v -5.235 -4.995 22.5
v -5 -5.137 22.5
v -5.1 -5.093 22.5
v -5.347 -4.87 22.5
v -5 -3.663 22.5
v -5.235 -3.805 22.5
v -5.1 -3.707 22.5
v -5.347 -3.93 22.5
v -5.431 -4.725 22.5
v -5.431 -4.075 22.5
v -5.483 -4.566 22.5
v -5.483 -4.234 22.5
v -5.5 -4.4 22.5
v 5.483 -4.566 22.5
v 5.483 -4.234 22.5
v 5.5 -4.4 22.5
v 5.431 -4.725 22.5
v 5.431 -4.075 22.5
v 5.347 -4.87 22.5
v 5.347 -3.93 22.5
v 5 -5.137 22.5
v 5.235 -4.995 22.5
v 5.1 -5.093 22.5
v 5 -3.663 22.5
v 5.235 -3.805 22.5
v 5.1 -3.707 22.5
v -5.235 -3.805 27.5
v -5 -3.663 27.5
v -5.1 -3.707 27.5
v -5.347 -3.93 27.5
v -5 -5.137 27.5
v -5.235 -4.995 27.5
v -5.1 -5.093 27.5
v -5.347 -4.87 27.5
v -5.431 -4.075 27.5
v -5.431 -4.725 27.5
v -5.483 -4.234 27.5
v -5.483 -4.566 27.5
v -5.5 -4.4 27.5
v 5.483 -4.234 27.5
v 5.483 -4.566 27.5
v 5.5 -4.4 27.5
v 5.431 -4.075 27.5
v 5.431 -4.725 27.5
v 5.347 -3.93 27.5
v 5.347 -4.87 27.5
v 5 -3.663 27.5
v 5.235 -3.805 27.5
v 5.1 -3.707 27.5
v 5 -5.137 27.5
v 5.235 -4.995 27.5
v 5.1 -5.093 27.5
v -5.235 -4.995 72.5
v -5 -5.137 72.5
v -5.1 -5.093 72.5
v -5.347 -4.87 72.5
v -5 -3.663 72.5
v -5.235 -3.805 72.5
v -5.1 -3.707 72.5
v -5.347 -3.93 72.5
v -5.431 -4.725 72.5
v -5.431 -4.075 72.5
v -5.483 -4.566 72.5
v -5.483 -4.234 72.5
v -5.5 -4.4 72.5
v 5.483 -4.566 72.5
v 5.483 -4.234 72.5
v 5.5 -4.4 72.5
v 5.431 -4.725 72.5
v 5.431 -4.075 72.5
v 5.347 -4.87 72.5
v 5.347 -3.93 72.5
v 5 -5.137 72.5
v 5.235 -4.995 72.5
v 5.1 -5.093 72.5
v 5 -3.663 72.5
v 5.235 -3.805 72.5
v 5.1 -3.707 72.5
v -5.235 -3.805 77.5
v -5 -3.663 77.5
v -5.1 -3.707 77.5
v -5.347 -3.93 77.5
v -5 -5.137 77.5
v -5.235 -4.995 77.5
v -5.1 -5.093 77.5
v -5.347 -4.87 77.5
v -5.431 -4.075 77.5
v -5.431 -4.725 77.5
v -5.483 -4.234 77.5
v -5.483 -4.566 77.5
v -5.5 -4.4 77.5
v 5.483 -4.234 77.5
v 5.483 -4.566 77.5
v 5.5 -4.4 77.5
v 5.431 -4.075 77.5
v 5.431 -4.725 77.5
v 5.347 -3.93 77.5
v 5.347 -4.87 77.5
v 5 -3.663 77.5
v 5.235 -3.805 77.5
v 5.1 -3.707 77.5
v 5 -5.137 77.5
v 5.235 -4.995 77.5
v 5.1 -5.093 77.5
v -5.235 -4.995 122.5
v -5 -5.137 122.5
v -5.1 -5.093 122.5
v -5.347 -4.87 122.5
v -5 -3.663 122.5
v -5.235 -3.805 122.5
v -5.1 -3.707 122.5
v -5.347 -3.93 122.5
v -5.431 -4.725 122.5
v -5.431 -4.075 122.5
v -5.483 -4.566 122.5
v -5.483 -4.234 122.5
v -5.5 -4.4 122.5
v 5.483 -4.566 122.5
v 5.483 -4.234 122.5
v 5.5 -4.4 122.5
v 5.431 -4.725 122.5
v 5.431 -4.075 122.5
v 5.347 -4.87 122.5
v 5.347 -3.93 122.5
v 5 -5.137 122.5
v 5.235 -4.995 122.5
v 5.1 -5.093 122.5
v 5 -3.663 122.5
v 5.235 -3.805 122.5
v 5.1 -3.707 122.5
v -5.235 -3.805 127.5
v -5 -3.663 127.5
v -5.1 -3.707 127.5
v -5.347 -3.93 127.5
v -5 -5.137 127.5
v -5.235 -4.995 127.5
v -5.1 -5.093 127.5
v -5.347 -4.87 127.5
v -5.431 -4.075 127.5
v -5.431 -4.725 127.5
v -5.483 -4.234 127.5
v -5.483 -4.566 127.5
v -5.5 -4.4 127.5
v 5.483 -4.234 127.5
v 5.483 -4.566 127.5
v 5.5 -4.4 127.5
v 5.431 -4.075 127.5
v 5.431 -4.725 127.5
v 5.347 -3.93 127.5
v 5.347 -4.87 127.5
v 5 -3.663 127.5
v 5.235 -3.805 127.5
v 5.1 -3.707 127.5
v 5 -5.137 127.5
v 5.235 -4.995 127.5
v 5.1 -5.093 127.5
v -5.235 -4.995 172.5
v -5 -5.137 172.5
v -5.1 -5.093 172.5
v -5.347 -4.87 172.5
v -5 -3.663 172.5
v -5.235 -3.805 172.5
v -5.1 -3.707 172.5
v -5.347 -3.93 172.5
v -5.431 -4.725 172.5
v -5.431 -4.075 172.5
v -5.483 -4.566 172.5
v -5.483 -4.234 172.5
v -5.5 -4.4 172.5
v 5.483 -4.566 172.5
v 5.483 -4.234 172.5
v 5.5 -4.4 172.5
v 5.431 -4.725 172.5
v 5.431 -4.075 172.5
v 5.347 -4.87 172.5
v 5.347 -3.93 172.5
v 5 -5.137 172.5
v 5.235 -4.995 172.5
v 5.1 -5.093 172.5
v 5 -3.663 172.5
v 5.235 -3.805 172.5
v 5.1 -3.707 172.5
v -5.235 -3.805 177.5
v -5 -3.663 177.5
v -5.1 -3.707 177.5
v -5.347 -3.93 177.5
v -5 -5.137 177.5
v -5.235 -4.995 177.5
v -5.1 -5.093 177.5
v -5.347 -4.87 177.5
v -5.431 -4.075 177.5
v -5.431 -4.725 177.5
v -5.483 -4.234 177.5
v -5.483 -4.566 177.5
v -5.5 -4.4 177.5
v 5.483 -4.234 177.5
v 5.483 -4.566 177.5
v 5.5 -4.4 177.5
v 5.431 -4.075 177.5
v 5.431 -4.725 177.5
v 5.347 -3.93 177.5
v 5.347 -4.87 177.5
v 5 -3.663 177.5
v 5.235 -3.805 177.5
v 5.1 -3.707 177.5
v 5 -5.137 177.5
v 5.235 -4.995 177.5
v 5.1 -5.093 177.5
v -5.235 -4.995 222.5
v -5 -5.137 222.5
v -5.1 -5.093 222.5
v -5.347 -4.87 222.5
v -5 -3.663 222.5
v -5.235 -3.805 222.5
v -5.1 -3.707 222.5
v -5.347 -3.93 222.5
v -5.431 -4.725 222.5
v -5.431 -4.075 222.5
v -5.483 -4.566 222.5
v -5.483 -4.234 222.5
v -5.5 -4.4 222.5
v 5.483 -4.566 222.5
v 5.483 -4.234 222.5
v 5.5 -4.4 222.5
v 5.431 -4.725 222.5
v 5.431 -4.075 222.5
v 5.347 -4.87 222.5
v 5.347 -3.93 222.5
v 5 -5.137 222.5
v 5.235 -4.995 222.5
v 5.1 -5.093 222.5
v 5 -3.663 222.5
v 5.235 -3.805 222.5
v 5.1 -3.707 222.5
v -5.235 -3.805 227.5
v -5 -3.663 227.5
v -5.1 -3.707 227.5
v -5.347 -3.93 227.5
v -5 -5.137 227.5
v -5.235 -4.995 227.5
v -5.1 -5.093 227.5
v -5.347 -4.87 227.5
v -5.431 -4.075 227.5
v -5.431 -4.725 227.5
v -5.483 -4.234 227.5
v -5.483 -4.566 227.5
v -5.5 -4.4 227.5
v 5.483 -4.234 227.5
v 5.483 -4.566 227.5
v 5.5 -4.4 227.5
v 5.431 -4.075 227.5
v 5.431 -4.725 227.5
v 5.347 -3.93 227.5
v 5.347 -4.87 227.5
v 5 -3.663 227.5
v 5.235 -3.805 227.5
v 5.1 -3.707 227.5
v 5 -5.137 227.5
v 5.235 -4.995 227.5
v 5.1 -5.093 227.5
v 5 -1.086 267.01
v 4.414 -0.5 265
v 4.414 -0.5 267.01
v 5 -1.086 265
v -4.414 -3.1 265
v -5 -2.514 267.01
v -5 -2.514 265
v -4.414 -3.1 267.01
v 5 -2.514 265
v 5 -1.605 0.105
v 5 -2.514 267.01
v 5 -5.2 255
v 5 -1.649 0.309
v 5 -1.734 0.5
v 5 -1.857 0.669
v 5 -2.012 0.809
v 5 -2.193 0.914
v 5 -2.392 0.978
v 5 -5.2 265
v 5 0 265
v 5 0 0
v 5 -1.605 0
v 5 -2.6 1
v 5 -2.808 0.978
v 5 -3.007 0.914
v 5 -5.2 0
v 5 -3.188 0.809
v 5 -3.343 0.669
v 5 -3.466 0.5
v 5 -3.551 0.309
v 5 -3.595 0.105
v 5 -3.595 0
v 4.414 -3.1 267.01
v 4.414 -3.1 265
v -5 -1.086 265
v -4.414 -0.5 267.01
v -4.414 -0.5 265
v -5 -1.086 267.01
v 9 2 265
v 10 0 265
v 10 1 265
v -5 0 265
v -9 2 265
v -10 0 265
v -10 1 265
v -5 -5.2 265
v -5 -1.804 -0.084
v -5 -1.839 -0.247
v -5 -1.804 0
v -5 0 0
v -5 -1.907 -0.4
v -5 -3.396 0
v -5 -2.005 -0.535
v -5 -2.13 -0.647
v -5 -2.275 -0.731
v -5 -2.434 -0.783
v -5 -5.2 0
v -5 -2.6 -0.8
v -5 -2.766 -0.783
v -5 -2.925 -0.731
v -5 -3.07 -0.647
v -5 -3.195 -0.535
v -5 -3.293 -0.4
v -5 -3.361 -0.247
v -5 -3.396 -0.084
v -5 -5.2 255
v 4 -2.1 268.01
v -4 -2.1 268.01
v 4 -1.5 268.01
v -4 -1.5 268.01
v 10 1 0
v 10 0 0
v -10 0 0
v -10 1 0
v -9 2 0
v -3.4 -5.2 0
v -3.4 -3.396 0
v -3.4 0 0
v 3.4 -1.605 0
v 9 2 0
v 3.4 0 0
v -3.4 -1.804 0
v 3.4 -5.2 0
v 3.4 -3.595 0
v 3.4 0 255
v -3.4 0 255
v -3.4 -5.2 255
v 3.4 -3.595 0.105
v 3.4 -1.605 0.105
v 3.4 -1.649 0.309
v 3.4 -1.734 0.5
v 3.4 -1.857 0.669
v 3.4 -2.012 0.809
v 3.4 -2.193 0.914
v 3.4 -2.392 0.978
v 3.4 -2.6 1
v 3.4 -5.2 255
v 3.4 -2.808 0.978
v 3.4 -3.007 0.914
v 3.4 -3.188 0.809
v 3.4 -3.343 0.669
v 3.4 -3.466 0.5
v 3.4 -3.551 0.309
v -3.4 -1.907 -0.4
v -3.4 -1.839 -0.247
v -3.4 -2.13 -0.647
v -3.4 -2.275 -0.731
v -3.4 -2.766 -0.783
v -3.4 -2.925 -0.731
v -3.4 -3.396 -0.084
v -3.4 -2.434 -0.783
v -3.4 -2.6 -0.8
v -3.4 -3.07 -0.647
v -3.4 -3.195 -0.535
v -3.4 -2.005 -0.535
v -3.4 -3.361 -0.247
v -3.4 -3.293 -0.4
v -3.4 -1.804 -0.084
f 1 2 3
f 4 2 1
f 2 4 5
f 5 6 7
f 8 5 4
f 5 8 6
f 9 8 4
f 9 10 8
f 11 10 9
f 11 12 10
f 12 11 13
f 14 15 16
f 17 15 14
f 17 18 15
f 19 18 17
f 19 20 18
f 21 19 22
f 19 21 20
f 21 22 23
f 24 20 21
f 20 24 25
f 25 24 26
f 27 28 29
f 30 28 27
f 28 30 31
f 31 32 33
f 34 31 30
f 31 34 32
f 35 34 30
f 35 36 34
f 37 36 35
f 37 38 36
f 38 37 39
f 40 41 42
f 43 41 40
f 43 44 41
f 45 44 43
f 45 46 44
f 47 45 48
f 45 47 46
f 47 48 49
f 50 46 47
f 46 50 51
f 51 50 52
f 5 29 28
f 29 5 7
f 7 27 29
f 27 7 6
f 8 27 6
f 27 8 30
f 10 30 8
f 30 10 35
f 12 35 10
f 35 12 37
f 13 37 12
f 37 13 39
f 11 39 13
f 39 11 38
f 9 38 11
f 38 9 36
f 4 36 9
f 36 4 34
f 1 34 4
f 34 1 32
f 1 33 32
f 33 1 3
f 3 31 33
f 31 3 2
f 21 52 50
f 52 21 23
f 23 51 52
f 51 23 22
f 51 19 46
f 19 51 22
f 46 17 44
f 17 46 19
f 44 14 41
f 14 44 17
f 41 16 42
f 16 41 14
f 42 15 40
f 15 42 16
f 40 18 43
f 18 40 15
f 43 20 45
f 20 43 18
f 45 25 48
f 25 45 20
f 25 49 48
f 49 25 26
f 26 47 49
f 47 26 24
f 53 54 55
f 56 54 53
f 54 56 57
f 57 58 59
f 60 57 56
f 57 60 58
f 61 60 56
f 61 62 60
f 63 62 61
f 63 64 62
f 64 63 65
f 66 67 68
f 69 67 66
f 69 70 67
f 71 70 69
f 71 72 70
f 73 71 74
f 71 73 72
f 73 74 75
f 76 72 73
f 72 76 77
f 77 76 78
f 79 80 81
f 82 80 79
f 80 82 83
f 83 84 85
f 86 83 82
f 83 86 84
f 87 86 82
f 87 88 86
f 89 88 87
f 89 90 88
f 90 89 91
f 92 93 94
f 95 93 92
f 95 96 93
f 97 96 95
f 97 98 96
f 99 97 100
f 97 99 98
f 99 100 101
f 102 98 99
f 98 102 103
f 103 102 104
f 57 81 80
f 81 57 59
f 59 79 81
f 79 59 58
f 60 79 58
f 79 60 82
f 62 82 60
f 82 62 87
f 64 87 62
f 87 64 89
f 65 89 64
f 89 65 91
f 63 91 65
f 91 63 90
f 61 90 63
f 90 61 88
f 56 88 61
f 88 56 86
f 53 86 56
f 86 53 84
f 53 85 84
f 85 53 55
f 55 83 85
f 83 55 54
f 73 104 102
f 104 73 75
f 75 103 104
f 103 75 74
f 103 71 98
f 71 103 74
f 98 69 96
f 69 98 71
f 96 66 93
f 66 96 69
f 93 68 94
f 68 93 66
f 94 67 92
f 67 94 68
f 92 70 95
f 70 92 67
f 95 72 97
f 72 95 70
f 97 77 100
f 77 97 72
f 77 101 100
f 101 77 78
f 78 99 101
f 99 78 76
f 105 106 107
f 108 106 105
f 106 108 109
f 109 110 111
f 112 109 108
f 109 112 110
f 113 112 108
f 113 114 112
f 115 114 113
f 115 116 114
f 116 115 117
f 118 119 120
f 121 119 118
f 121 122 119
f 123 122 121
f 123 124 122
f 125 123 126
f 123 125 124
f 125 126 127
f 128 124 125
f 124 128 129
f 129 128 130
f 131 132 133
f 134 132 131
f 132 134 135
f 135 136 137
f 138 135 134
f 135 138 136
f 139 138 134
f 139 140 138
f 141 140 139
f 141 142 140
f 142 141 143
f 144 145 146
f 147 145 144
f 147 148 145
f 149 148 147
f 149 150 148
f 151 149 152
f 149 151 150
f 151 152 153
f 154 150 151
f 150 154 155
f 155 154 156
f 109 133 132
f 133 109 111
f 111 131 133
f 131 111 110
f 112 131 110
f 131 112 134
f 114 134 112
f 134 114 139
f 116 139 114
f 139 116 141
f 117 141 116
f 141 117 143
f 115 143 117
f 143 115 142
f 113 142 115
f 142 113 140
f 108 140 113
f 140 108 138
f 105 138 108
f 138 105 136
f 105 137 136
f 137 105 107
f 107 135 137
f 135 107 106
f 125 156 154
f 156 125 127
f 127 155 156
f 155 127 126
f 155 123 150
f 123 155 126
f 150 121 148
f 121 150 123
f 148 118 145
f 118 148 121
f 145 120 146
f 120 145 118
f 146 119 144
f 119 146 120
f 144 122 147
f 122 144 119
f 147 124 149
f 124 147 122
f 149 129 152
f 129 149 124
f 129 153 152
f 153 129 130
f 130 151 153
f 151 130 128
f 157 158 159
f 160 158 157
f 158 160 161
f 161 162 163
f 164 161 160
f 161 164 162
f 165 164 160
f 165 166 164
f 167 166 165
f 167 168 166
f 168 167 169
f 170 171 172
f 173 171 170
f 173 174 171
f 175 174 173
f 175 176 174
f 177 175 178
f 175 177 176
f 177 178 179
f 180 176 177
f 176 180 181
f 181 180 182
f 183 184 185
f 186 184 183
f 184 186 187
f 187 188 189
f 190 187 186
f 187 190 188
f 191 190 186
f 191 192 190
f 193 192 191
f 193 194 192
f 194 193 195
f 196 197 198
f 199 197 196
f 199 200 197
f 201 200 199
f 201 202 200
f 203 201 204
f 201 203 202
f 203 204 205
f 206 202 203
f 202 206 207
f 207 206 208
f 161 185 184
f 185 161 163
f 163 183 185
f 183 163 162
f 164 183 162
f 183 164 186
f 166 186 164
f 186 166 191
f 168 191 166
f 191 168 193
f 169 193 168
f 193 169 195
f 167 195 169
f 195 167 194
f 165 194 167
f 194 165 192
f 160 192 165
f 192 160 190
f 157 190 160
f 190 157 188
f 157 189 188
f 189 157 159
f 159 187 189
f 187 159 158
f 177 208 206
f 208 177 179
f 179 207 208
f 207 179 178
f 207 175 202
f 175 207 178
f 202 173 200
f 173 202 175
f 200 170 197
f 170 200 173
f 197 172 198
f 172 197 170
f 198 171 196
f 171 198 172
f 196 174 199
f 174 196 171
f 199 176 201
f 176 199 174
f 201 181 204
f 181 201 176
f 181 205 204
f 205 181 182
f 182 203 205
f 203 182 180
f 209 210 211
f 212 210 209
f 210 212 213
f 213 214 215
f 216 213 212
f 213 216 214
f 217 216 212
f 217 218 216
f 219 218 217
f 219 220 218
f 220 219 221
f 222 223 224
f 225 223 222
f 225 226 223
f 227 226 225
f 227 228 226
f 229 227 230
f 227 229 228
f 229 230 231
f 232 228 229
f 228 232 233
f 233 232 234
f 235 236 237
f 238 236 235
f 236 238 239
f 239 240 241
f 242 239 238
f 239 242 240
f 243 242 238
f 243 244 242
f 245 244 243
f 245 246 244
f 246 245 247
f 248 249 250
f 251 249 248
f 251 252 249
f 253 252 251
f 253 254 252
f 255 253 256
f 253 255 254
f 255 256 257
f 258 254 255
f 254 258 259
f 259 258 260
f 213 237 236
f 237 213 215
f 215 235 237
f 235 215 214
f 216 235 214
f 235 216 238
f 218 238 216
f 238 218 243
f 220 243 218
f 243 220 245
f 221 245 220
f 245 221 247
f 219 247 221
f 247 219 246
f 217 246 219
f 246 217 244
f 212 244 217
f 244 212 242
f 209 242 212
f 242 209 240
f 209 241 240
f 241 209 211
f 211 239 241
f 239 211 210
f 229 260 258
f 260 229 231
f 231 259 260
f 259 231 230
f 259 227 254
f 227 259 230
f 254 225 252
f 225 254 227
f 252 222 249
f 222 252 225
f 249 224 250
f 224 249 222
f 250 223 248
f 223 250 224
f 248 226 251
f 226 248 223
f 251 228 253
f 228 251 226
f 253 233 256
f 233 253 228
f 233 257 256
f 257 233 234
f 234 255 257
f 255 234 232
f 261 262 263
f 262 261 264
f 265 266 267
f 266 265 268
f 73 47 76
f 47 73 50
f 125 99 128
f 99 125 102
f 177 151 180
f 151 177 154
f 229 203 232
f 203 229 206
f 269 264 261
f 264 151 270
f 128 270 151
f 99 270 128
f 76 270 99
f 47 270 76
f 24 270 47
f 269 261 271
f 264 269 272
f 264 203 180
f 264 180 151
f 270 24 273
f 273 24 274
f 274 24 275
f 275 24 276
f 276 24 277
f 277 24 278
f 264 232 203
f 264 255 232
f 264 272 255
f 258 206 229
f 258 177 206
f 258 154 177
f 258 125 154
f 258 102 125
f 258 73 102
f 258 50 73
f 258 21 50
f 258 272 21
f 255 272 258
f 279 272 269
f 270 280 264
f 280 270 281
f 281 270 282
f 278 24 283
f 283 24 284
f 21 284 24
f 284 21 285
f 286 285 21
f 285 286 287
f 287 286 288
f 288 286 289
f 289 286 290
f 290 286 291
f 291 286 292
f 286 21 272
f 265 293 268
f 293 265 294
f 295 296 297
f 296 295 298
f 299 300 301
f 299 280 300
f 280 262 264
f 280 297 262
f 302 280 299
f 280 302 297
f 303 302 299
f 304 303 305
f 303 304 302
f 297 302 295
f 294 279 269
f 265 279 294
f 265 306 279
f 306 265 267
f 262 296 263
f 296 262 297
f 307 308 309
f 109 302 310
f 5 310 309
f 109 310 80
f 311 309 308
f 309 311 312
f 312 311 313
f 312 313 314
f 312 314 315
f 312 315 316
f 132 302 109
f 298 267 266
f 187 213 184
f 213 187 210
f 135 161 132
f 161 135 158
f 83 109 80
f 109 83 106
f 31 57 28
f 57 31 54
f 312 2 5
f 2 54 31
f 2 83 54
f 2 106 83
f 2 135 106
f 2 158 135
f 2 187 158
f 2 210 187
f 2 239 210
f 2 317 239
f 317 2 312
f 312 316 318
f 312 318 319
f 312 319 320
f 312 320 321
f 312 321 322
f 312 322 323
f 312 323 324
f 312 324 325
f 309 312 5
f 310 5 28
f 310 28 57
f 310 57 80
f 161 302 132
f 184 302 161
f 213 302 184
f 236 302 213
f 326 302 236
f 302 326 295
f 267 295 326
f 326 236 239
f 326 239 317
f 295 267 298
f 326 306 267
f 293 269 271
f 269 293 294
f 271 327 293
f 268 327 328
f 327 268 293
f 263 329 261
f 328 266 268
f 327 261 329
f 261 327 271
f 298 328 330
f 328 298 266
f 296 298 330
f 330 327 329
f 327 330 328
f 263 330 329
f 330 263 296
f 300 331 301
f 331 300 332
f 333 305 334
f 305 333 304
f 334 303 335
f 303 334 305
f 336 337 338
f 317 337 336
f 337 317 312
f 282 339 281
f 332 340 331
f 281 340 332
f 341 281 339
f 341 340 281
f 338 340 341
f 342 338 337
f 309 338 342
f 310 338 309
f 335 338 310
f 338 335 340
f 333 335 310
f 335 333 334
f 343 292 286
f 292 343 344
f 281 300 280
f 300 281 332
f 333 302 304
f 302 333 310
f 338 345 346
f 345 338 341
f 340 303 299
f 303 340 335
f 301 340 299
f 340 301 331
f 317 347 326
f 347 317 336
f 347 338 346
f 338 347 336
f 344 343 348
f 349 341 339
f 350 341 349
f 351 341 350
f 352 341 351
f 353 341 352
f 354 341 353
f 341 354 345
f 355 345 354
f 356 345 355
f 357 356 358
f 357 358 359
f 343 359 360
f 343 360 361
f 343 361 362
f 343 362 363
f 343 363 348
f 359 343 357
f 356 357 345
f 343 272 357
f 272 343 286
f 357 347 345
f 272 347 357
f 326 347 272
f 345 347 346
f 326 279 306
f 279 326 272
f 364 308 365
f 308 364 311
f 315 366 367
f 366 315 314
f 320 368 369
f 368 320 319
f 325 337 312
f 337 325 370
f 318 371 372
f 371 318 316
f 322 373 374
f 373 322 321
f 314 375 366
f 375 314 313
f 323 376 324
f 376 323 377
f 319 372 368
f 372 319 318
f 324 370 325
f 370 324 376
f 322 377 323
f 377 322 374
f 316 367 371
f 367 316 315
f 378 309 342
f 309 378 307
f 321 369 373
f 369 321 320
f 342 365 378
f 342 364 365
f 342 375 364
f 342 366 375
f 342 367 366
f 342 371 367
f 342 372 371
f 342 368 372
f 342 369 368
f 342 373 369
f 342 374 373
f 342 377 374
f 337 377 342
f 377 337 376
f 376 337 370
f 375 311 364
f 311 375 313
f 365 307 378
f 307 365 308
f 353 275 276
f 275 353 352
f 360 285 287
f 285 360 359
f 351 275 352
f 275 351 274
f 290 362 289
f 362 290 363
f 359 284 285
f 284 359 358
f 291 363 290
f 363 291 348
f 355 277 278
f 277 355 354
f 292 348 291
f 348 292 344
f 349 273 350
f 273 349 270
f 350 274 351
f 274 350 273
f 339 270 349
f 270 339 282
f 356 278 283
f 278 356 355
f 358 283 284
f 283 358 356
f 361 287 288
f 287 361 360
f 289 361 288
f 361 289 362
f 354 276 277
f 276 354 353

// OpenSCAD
// =========================================================================
// Frameless Solar Panel Gap Cover - Single Symmetric Half Design
// Version: 0.56
// =========================================================================

/* [Global Dimensions] */
panel_thickness = 3.6;   // Thickness of frameless panels (mm)
gap_width       = 10.0;  // Gap between panels (mm)
//total_length    = 518.0; // Total assembled cover cap length (mm)
total_length    = 530.0; // Total assembled cover cap length (mm)
cover_width     = 20.0;  // Width of top cap (mm)
top_thickness   = 2.0;   // Thickness of top cap (mm)

/* [Segmented Clips Settings] */
clip_segment_length = 5.0; // Length of individual snap bumps/barbs (mm)
clip_pitch          = 50.0; // Spacing pitch between clip bumps along the cap (mm)

/* [Channel End] */
closed_channel_end = false; // Close the open channel end (Z=0 joint face) with a wall (thickness = wall_thickness)

/* [Interlock Settings] */
enable_interlock    = true; // Enable the half-circle tab/cavity that aligns the two halves at the joint
interlock_radius    = 0.8;  // Radius of the mating half-circle tab at the joint (mm)
interlock_tolerance = 0.2;  // Clearance for the interlock cavity (mm)

/* [Uniform Chamfer Control] */
chamfer_size    = 1.0;   // Global uniform chamfer size applied to cap, tab edges, and lead-ins (mm)

/* [Clip Dimensions] */
wall_thickness  = 1.6;   // Wall thickness for clip legs/channel walls (mm)
snap_barb_size  = 0.8;   // Half-circle bump overhang radius (mm)
clip_inset      = 0.3;   // Distance to move clips inward to reduce protrusion, easing installation (mm)

/* [End Clearances (Washer/Strut Extensions)] */
end_extension_length = 3.0;                    // Length of separate/integrated extension tabs (mm)
extension_thickness  = panel_thickness - 1.0;   // Extension thickness is 1mm thinner than the solar panel (2.6mm)

/* [Render Selection] */
part_to_render = "single_half"; // [assembly: Full Assembly (2x Unified Halves), single_half: Single Unified Half (To Print)]

// =========================================================================
// CALCULATED CONSTANTS
// =========================================================================
half_cap_length = total_length / 2; // 260mm top cap length per unit

// Wall depth is extended so the clip sits entirely below the solar panel
channel_depth = panel_thickness + (snap_barb_size * 2); 

// =========================================================================
// MAIN RENDER SWITCH
// =========================================================================
if (part_to_render == "assembly") {
    // Upper Half: Placed from Z = 0 to Z = 260mm (extension points upward to +Z)
    color("SteelBlue") 
        cover_half();
    
    // Lower Half: Rotated 180° around Y-axis & translated to Z = 0 (extension points downward to -Z)
    // Placed from Z = 0 to Z = -260mm, mating smoothly with upper half exactly at Z = 0
    color("LightSlateGray") 
        translate([0, 0, 0])
            rotate([0, 180, 0])
                cover_half();

} else if (part_to_render == "single_half") {
    cover_half();

}

// =========================================================================
// MODULES
// =========================================================================

// Unified Symmetric Half Module (Print 2 identical copies for 1 full assembly)
module cover_half() {
    difference() {
        union() {
            // 1. Continuous Top Cover Cap Profile
            linear_extrude(height = half_cap_length) {
                top_cap_2d_profile();
            }
            
            // 2. Continuous Straight Channel Walls
            linear_extrude(height = half_cap_length) {
                continuous_channel_2d_profile();
            }
            
            // 3. Distributed Interval Snap Bumps
            segmented_snap_bumps(half_cap_length);
            
            // 4. Solid Structural Fill Block (~10mm) between channel walls near top end
            translate([0, 0, half_cap_length - 10.0]) {
                linear_extrude(height = 10.0) {
                    solid_channel_fill_2d();
                }
            }
            
            // 4b. Optional end wall closing the open channel end at the Z=0 joint
            if (closed_channel_end) {
                linear_extrude(height = wall_thickness) {
                    solid_channel_fill_2d();
                }
            }
            
            // 5. End Extension Tab extending outward from the far end
            translate([0, 0, half_cap_length]) {
                end_extension();
            }
            
            // 6. Interlocking Horizontal Tab (Left channel wall, Z=0 face)
            // Oriented along X-axis inside the wall to lock Y-axis
            if (enable_interlock) {
                translate([-gap_width/2, -channel_depth/2, 0])
                    rotate([0, 90, 0])
                        cylinder(h=wall_thickness, r=interlock_radius, $fn=30);
            }
        }
        
        // Interlocking Horizontal Cavity Cutout (Right channel wall, Z=0 face)
        // Creates a pocket inside the right wall's Z>0 body to receive the other half's tab
        if (enable_interlock) {
            translate([gap_width/2 - wall_thickness - 0.1, -channel_depth/2, 0])
                rotate([0, 90, 0])
                    cylinder(h=wall_thickness + 0.2, r=interlock_radius + interlock_tolerance, $fn=30);
        }
    }
}

// Extension Tab Module at top end of half (reaches outer end of extension)
module end_extension() {
    c = chamfer_size;
    L = end_extension_length;

    union() {
        // 1. Full Extension Body extending to Z = L - c
        linear_extrude(height = L - c) {
            extension_chamfered_2d();
        }

        // 2. Outer Tip Chamfer at very end of extension
        translate([0, 0, L - c]) {
            hull() {
                linear_extrude(height = 0.01) {
                    extension_chamfered_2d();
                }
                translate([0, 0, c]) {
                    linear_extrude(height = 0.01) {
                        offset(delta = -c, chamfer = true) {
                            extension_chamfered_2d();
                        }
                    }
                }
            }
        }
    }
}

// Module to distribute 10mm half-circle snap bumps evenly every 50mm pitch
module segmented_snap_bumps(length) {
    start_offset = clip_pitch / 2;
    
    for (z = [start_offset : clip_pitch : length - (clip_segment_length / 2)]) {
        translate([0, 0, z - (clip_segment_length / 2)])
            linear_extrude(height = clip_segment_length) {
                clip_bumps_2d_profile();
            }
    }
}

// 2D Extension Profile (Centered in the solar panel thickness)
module extension_raw_2d() {
    leg_x_outer = gap_width / 2;
    translate([-leg_x_outer, -panel_thickness/2 - extension_thickness/2])
        square([gap_width, extension_thickness]);
}

// 2D Extension Profile with Uniform Edge Chamfers
module extension_chamfered_2d() {
    offset(delta = chamfer_size, chamfer = true)
        offset(delta = -chamfer_size, chamfer = true)
            extension_raw_2d();
}

// 2D Profile for Top Cap with Uniform Chamfers
module top_cap_2d_profile() {
    c = chamfer_size;
    polygon(points = [
        [-cover_width/2 + c, top_thickness],
        [ cover_width/2 - c, top_thickness],
        [ cover_width/2,     top_thickness - c],
        [ cover_width/2,     0],
        [-cover_width/2,     0],
        [-cover_width/2,     top_thickness - c]
    ]);
}

// 2D Profile for Continuous Channel Legs (Straight Walls)
module continuous_channel_2d_profile() {
    leg_x_outer = gap_width / 2;
    leg_x_inner = leg_x_outer - wall_thickness;
    
    union() {
        // Left Wall
        polygon(points = [
            [-leg_x_outer, 0],
            [-leg_x_inner, 0],
            [-leg_x_inner, -channel_depth],
            [-leg_x_outer, -channel_depth]
        ]);
        
        // Right Wall
        polygon(points = [
            [leg_x_outer, 0],
            [leg_x_inner, 0],
            [leg_x_inner, -channel_depth],
            [leg_x_outer, -channel_depth]
        ]);
    }
}

// 2D Solid Fill Profile for the Gap Between Channel Legs
module solid_channel_fill_2d() {
    leg_x_outer = gap_width / 2;
    translate([-leg_x_outer, -channel_depth])
        square([gap_width, channel_depth]);
}

// 2D Profile for Smooth Half-Circle Retention Bumps (Only added at intervals)
module clip_bumps_2d_profile() {
    leg_x_outer = gap_width / 2;
    r = snap_barb_size;
    
    // Position bump so its absolute highest point is exactly at the bottom of the panel
    center_y = -panel_thickness - r;
    
    union() {
        // Left Leg Half-Circle Snap Bump (Moved inward by clip_inset)
        translate([-leg_x_outer + clip_inset, center_y])
            difference() {
                circle(r = r, $fn = 30);
                translate([0, -r * 2])
                    square([r * 2, r * 4]);
            }
        
        // Right Leg Half-Circle Snap Bump (Moved inward by clip_inset)
        translate([leg_x_outer - clip_inset, center_y])
            difference() {
                circle(r = r, $fn = 30);
                translate([-r * 2, -r * 2])
                    square([r * 2, r * 4]);
            }
    }
}
